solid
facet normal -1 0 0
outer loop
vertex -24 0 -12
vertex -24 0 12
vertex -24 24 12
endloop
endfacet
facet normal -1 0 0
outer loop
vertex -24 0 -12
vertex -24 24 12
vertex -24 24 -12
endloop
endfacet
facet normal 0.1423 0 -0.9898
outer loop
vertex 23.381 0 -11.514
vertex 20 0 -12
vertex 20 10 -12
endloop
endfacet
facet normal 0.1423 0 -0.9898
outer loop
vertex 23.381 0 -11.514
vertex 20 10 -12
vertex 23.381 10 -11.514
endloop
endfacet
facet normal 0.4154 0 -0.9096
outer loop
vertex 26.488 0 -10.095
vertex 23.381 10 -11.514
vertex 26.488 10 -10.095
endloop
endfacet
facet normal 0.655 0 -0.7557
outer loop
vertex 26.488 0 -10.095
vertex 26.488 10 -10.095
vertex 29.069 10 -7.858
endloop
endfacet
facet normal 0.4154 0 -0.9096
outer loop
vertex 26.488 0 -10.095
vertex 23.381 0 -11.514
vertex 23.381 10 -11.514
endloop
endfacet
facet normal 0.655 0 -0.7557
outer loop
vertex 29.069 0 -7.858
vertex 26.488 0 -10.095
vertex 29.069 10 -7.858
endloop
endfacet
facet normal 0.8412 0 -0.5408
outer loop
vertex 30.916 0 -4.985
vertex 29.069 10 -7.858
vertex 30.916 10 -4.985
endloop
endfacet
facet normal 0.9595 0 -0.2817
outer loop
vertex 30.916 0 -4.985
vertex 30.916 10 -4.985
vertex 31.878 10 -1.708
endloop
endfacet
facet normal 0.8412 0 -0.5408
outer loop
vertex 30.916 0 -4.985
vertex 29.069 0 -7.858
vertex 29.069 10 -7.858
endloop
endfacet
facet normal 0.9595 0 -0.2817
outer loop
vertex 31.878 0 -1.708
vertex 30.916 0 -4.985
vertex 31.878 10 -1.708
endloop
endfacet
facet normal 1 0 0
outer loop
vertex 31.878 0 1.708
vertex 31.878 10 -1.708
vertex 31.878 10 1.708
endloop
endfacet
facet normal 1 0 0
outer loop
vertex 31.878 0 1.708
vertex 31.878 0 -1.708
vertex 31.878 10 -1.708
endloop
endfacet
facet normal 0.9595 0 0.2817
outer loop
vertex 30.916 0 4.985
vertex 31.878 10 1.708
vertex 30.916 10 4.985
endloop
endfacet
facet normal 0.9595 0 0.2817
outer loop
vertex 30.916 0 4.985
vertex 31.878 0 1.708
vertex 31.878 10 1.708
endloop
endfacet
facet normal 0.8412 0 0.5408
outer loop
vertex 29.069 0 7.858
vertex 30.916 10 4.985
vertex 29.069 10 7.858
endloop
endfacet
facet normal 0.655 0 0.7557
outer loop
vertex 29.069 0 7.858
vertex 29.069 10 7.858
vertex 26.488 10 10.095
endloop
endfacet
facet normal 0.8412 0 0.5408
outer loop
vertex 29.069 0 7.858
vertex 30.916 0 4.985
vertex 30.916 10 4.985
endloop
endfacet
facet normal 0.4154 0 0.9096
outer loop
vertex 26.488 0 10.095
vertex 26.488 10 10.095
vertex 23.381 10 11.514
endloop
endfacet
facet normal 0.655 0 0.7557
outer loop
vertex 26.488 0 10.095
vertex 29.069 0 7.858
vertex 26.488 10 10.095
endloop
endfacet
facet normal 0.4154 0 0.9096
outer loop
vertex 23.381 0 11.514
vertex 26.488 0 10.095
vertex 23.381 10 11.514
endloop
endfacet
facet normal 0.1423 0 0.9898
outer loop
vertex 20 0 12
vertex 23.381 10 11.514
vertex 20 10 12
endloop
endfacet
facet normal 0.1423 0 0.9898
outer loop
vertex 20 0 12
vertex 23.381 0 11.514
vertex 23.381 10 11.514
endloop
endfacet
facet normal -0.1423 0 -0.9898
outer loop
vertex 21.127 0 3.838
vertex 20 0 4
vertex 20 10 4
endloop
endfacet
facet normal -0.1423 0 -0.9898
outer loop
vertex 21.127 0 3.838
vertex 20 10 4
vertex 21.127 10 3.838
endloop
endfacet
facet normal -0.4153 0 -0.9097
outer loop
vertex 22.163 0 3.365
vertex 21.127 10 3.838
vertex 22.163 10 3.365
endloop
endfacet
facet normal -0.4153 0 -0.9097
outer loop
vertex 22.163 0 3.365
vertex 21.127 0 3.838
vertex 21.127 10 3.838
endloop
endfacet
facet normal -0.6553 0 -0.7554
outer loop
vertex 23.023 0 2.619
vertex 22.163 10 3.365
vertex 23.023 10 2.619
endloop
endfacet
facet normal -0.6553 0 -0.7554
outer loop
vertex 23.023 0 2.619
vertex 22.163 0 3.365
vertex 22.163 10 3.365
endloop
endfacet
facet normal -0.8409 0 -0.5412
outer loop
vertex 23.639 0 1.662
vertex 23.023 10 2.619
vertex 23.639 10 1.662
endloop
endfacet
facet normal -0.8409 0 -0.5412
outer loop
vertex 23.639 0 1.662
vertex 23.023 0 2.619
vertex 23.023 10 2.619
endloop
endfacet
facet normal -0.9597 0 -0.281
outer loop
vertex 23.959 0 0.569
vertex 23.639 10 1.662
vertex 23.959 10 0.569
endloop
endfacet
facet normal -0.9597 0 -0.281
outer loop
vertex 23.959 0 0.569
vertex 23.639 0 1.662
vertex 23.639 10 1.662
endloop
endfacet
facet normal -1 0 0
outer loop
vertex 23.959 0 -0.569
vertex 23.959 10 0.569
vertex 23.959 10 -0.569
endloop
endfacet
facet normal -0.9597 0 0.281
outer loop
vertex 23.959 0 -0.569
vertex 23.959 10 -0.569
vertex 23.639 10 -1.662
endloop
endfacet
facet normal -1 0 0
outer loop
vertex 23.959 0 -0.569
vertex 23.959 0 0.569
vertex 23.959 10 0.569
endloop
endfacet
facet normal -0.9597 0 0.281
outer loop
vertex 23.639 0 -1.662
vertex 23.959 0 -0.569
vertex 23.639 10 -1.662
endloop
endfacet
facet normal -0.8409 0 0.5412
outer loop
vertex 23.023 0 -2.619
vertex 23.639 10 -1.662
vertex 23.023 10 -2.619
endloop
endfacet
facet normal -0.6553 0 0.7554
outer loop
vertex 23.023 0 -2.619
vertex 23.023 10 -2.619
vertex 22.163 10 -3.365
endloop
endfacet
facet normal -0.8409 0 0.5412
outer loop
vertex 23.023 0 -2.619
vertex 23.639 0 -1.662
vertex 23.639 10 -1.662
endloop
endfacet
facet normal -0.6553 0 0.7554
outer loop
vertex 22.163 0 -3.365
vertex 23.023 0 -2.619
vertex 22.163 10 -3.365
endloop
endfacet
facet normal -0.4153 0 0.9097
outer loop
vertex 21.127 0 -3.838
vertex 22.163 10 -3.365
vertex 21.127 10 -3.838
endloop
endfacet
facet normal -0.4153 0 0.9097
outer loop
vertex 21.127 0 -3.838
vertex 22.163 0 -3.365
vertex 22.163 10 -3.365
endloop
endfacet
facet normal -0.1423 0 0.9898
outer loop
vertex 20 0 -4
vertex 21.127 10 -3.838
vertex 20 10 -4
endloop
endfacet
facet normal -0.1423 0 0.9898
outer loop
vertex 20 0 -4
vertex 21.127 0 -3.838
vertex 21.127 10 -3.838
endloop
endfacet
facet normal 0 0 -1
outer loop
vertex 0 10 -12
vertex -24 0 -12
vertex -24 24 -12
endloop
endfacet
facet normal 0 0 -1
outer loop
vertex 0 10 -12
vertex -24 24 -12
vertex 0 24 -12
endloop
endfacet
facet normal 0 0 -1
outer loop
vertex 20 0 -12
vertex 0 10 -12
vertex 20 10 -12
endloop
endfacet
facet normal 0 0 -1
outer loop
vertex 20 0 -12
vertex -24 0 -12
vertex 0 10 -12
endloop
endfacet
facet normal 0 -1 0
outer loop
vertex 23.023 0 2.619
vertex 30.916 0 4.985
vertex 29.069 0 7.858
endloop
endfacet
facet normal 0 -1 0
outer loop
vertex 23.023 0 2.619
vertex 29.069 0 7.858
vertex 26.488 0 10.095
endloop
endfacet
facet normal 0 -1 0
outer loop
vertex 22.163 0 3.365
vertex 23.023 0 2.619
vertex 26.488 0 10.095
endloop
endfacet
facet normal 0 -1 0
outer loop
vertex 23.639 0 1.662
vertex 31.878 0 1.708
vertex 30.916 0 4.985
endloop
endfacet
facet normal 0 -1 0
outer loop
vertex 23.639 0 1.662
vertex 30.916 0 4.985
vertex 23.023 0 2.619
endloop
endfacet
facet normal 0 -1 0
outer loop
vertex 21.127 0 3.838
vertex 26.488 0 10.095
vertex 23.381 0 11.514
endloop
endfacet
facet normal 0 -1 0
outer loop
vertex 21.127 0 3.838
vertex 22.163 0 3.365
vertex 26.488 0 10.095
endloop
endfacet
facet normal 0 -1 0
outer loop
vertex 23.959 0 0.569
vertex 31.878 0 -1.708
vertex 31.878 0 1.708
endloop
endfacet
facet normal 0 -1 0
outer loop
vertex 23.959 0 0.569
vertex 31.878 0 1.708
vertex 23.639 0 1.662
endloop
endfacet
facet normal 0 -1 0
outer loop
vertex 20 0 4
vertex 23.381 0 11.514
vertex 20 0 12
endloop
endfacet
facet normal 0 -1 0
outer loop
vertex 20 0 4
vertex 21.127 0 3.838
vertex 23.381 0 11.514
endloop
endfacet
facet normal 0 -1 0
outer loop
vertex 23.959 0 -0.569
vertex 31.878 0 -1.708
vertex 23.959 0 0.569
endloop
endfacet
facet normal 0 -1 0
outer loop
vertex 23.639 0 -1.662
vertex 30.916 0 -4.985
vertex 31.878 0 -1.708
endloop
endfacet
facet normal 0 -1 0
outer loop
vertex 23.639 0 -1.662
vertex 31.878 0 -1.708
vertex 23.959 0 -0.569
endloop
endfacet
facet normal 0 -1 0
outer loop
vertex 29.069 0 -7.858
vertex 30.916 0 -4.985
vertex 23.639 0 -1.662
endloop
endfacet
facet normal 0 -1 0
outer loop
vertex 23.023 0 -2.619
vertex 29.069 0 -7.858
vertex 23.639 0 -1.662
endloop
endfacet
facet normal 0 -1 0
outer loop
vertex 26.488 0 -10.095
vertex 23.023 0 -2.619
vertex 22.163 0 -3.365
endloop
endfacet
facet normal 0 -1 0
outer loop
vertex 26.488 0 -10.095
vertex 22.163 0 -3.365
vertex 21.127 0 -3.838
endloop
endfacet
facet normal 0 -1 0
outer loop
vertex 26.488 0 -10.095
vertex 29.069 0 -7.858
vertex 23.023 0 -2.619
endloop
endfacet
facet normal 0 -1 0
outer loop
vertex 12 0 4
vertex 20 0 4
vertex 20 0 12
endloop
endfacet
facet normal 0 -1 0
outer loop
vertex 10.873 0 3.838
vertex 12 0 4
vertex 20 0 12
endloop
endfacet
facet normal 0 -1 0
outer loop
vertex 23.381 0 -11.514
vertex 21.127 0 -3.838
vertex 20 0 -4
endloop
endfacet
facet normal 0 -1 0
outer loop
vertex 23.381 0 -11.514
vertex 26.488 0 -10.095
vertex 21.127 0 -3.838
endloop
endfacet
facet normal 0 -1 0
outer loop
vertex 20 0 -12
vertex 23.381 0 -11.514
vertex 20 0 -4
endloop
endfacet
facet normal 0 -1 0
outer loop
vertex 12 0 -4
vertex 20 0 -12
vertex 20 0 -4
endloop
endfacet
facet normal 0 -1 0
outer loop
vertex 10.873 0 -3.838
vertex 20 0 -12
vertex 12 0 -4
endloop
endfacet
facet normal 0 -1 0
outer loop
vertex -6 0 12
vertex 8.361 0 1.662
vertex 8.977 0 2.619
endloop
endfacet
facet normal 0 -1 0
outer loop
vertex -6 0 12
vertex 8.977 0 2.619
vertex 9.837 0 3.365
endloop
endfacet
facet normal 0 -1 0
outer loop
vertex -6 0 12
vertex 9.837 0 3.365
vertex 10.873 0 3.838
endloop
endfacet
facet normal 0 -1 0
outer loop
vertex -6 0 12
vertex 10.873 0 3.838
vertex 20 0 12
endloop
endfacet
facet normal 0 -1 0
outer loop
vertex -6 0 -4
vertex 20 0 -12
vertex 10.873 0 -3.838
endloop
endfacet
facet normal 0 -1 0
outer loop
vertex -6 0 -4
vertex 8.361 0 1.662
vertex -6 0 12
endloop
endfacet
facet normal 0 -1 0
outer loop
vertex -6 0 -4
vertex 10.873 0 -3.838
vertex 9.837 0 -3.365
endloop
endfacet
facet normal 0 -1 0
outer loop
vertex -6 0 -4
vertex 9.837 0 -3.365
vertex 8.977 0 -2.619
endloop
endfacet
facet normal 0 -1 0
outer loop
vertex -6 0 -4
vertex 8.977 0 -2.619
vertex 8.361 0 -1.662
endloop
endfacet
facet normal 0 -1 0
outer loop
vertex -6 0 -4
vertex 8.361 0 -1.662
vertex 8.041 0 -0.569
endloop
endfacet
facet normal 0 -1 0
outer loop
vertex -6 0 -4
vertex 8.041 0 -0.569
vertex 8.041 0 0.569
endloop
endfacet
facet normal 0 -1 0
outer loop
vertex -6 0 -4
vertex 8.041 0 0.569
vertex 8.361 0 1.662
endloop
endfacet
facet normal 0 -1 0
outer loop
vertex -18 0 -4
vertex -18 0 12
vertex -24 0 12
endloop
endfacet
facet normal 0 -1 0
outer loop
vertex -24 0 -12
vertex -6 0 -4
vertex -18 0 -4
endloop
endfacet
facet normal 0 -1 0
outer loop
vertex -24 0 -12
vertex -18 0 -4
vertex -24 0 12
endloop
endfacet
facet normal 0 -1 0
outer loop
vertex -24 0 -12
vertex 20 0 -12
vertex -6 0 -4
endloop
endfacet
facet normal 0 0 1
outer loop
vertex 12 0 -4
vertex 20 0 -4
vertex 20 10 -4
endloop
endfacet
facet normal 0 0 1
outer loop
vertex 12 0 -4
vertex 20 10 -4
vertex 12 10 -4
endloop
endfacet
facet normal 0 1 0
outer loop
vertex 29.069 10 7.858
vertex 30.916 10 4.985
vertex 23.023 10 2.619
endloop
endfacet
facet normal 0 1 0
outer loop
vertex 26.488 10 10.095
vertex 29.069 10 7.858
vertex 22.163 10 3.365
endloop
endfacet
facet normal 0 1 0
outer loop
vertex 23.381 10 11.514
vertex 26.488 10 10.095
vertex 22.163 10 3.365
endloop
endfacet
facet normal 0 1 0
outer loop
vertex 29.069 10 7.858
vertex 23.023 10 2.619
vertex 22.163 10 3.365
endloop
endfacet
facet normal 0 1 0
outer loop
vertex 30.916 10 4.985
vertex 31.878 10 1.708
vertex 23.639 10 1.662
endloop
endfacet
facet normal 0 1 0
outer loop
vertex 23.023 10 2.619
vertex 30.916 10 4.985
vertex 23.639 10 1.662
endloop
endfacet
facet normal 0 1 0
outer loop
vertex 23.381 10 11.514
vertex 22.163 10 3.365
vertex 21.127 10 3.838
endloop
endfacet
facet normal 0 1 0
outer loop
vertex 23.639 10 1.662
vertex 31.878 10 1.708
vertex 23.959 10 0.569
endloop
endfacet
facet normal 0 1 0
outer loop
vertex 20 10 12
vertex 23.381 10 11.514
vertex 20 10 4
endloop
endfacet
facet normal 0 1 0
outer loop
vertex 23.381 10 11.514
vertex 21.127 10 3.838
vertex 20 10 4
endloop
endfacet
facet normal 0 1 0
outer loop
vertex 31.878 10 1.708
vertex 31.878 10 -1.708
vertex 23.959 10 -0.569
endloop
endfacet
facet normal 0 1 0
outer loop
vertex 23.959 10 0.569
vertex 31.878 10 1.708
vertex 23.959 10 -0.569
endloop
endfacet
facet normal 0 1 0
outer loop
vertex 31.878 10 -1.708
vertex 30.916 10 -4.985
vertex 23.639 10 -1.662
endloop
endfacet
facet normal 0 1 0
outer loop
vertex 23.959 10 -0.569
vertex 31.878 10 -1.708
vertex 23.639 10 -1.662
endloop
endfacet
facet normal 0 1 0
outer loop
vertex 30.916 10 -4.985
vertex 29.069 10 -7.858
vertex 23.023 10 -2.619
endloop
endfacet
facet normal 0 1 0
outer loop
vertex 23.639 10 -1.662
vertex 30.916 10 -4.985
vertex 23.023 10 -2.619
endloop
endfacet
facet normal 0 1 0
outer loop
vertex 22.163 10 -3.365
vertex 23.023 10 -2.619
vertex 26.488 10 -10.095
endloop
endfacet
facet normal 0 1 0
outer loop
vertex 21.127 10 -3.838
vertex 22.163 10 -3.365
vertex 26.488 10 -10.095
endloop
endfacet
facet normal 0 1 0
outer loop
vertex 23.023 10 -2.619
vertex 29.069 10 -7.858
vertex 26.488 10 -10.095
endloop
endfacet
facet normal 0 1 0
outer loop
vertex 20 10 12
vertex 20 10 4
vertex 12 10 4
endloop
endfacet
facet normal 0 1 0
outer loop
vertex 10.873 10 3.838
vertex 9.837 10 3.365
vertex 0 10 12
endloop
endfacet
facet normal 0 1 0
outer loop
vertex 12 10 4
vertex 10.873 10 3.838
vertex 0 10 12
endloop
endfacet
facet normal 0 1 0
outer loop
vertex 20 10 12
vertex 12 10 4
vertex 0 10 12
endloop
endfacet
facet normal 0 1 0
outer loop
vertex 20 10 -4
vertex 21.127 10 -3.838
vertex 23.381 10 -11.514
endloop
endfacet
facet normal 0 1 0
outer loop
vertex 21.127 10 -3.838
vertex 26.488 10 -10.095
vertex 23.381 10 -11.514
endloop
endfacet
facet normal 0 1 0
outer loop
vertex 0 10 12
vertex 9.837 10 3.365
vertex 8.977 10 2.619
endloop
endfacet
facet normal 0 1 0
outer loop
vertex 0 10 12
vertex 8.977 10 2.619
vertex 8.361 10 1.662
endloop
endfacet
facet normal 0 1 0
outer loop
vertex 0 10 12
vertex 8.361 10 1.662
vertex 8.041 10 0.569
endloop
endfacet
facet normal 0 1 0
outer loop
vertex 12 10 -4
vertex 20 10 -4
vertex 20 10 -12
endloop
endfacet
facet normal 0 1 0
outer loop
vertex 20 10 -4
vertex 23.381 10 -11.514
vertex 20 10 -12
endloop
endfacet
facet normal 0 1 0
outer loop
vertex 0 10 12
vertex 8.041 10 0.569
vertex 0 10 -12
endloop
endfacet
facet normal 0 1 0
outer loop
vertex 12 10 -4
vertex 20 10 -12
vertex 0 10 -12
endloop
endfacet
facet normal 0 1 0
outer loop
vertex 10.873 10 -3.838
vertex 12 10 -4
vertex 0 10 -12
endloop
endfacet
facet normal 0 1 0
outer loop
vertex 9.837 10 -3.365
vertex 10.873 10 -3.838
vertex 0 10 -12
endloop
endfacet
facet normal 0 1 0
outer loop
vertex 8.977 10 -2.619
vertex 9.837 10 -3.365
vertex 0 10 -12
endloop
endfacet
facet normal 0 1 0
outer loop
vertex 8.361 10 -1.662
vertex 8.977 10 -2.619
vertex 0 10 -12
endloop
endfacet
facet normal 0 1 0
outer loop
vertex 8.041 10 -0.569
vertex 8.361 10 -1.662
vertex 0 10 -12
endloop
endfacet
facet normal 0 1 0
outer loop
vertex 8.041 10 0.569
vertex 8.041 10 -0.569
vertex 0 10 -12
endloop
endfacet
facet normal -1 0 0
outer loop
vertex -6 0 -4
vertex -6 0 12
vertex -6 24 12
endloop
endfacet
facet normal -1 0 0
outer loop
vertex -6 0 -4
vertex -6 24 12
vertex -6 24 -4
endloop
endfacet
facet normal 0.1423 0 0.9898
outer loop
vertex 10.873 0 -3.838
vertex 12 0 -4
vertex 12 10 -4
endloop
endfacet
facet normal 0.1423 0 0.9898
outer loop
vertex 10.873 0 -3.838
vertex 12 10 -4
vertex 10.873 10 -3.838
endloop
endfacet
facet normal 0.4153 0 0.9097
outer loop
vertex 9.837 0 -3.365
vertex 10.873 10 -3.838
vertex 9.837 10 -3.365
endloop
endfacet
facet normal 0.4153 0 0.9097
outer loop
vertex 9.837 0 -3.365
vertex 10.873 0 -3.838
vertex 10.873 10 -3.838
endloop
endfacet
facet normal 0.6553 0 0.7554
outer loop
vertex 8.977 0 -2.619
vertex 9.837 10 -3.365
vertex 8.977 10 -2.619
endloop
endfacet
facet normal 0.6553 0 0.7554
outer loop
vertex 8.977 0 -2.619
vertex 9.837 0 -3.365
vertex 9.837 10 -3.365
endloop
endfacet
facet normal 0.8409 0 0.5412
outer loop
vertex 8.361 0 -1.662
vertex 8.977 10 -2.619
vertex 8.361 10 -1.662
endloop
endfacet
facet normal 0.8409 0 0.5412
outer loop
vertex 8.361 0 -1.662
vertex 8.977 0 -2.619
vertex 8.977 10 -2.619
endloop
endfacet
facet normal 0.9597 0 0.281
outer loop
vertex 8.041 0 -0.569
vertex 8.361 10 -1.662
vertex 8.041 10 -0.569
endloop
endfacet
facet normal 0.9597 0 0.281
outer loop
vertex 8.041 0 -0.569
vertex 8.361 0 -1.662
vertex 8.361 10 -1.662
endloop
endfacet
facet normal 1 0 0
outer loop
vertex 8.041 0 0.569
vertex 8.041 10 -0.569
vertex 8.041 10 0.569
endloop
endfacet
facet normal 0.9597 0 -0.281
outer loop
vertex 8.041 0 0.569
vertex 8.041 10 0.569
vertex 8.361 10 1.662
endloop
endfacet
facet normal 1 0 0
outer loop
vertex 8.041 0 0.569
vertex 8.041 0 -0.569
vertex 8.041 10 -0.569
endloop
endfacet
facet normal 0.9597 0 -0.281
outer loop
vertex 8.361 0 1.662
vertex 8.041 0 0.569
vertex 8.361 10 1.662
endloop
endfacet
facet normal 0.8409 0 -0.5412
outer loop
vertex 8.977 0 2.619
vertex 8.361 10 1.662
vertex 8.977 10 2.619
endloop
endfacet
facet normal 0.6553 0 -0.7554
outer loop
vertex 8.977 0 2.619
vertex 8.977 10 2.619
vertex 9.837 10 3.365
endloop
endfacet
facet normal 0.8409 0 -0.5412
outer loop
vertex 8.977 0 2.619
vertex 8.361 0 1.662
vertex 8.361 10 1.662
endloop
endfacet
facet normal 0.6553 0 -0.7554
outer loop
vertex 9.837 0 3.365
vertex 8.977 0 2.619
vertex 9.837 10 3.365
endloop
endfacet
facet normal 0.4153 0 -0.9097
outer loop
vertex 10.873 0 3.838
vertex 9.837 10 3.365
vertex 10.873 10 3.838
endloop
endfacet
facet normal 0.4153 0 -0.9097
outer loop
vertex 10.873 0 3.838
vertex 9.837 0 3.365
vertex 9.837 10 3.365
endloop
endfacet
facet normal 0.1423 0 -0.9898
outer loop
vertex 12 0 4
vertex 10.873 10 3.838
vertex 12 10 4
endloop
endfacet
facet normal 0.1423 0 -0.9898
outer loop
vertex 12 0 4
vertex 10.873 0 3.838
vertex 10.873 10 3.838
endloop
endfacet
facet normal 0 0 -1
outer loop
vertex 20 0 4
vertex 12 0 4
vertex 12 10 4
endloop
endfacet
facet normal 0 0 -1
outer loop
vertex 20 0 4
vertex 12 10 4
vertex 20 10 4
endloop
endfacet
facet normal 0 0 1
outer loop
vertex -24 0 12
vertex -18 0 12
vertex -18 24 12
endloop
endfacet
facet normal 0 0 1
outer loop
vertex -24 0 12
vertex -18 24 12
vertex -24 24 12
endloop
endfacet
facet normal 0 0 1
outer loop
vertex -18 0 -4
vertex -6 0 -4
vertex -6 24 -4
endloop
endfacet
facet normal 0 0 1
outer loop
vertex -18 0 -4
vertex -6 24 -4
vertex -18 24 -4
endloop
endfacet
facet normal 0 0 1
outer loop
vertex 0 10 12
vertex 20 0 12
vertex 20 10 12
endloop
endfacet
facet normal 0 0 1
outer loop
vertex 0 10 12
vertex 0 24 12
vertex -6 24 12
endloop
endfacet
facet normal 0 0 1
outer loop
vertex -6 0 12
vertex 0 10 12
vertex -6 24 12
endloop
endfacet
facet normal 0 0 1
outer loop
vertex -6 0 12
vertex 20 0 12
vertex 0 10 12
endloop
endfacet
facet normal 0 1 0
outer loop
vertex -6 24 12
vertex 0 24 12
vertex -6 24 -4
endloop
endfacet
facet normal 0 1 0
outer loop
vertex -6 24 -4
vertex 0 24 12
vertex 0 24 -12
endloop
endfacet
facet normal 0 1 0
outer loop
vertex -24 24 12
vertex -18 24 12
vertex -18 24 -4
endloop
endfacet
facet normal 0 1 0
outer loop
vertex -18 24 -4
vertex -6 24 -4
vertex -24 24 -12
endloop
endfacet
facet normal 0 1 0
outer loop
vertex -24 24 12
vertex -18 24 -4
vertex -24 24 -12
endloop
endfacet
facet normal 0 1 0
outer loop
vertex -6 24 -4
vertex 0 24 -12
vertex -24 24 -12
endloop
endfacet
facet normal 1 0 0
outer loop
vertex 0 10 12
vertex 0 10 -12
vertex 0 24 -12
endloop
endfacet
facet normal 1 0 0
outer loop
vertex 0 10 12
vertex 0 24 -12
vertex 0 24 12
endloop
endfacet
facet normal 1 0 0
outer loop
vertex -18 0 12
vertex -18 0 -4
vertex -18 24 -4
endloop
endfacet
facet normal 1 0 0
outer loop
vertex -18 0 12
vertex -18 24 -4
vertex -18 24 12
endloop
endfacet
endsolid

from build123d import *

# Parameters (mm, degrees)
BOSS_EXTRUDE1_DEPTH = 24
BOSS_EXTRUDE2_DEPTH = 10


with BuildPart() as part:
    # Sketch1 → Boss-Extrude1 (new body)
    with BuildSketch(Plane(origin=(0, 0, 0), x_dir=(1, 0, 0), z_dir=(0, 1, 0))):
        Polygon((0, -12), (0, 12), (-24, 12), (-24, -12), (-18, -12), (-18, 4), (-6, 4), (-6, -12), align=None)
    extrude(amount=BOSS_EXTRUDE1_DEPTH)

    # Sketch1<3> → Boss-Extrude2 (add)
    with BuildSketch(Plane(origin=(0, 0, 0), x_dir=(1, 0, 0), z_dir=(0, 1, 0))):
        with BuildLine():
            Line((20, 12), (0, 12))
            Line((0, 12), (0, -12))
            Line((0, -12), (20, -12))
            ThreePointArc((20, -12), (32, 0), (20, 12))
        make_face()
        with BuildLine():
            ThreePointArc((20, 4), (24, 0), (20, -4))
            Line((20, -4), (12, -4))
            ThreePointArc((12, -4), (8, 0), (12, 4))
            Line((12, 4), (20, 4))
        make_face(mode=Mode.SUBTRACT)
    extrude(amount=BOSS_EXTRUDE2_DEPTH)


solid = part.part
